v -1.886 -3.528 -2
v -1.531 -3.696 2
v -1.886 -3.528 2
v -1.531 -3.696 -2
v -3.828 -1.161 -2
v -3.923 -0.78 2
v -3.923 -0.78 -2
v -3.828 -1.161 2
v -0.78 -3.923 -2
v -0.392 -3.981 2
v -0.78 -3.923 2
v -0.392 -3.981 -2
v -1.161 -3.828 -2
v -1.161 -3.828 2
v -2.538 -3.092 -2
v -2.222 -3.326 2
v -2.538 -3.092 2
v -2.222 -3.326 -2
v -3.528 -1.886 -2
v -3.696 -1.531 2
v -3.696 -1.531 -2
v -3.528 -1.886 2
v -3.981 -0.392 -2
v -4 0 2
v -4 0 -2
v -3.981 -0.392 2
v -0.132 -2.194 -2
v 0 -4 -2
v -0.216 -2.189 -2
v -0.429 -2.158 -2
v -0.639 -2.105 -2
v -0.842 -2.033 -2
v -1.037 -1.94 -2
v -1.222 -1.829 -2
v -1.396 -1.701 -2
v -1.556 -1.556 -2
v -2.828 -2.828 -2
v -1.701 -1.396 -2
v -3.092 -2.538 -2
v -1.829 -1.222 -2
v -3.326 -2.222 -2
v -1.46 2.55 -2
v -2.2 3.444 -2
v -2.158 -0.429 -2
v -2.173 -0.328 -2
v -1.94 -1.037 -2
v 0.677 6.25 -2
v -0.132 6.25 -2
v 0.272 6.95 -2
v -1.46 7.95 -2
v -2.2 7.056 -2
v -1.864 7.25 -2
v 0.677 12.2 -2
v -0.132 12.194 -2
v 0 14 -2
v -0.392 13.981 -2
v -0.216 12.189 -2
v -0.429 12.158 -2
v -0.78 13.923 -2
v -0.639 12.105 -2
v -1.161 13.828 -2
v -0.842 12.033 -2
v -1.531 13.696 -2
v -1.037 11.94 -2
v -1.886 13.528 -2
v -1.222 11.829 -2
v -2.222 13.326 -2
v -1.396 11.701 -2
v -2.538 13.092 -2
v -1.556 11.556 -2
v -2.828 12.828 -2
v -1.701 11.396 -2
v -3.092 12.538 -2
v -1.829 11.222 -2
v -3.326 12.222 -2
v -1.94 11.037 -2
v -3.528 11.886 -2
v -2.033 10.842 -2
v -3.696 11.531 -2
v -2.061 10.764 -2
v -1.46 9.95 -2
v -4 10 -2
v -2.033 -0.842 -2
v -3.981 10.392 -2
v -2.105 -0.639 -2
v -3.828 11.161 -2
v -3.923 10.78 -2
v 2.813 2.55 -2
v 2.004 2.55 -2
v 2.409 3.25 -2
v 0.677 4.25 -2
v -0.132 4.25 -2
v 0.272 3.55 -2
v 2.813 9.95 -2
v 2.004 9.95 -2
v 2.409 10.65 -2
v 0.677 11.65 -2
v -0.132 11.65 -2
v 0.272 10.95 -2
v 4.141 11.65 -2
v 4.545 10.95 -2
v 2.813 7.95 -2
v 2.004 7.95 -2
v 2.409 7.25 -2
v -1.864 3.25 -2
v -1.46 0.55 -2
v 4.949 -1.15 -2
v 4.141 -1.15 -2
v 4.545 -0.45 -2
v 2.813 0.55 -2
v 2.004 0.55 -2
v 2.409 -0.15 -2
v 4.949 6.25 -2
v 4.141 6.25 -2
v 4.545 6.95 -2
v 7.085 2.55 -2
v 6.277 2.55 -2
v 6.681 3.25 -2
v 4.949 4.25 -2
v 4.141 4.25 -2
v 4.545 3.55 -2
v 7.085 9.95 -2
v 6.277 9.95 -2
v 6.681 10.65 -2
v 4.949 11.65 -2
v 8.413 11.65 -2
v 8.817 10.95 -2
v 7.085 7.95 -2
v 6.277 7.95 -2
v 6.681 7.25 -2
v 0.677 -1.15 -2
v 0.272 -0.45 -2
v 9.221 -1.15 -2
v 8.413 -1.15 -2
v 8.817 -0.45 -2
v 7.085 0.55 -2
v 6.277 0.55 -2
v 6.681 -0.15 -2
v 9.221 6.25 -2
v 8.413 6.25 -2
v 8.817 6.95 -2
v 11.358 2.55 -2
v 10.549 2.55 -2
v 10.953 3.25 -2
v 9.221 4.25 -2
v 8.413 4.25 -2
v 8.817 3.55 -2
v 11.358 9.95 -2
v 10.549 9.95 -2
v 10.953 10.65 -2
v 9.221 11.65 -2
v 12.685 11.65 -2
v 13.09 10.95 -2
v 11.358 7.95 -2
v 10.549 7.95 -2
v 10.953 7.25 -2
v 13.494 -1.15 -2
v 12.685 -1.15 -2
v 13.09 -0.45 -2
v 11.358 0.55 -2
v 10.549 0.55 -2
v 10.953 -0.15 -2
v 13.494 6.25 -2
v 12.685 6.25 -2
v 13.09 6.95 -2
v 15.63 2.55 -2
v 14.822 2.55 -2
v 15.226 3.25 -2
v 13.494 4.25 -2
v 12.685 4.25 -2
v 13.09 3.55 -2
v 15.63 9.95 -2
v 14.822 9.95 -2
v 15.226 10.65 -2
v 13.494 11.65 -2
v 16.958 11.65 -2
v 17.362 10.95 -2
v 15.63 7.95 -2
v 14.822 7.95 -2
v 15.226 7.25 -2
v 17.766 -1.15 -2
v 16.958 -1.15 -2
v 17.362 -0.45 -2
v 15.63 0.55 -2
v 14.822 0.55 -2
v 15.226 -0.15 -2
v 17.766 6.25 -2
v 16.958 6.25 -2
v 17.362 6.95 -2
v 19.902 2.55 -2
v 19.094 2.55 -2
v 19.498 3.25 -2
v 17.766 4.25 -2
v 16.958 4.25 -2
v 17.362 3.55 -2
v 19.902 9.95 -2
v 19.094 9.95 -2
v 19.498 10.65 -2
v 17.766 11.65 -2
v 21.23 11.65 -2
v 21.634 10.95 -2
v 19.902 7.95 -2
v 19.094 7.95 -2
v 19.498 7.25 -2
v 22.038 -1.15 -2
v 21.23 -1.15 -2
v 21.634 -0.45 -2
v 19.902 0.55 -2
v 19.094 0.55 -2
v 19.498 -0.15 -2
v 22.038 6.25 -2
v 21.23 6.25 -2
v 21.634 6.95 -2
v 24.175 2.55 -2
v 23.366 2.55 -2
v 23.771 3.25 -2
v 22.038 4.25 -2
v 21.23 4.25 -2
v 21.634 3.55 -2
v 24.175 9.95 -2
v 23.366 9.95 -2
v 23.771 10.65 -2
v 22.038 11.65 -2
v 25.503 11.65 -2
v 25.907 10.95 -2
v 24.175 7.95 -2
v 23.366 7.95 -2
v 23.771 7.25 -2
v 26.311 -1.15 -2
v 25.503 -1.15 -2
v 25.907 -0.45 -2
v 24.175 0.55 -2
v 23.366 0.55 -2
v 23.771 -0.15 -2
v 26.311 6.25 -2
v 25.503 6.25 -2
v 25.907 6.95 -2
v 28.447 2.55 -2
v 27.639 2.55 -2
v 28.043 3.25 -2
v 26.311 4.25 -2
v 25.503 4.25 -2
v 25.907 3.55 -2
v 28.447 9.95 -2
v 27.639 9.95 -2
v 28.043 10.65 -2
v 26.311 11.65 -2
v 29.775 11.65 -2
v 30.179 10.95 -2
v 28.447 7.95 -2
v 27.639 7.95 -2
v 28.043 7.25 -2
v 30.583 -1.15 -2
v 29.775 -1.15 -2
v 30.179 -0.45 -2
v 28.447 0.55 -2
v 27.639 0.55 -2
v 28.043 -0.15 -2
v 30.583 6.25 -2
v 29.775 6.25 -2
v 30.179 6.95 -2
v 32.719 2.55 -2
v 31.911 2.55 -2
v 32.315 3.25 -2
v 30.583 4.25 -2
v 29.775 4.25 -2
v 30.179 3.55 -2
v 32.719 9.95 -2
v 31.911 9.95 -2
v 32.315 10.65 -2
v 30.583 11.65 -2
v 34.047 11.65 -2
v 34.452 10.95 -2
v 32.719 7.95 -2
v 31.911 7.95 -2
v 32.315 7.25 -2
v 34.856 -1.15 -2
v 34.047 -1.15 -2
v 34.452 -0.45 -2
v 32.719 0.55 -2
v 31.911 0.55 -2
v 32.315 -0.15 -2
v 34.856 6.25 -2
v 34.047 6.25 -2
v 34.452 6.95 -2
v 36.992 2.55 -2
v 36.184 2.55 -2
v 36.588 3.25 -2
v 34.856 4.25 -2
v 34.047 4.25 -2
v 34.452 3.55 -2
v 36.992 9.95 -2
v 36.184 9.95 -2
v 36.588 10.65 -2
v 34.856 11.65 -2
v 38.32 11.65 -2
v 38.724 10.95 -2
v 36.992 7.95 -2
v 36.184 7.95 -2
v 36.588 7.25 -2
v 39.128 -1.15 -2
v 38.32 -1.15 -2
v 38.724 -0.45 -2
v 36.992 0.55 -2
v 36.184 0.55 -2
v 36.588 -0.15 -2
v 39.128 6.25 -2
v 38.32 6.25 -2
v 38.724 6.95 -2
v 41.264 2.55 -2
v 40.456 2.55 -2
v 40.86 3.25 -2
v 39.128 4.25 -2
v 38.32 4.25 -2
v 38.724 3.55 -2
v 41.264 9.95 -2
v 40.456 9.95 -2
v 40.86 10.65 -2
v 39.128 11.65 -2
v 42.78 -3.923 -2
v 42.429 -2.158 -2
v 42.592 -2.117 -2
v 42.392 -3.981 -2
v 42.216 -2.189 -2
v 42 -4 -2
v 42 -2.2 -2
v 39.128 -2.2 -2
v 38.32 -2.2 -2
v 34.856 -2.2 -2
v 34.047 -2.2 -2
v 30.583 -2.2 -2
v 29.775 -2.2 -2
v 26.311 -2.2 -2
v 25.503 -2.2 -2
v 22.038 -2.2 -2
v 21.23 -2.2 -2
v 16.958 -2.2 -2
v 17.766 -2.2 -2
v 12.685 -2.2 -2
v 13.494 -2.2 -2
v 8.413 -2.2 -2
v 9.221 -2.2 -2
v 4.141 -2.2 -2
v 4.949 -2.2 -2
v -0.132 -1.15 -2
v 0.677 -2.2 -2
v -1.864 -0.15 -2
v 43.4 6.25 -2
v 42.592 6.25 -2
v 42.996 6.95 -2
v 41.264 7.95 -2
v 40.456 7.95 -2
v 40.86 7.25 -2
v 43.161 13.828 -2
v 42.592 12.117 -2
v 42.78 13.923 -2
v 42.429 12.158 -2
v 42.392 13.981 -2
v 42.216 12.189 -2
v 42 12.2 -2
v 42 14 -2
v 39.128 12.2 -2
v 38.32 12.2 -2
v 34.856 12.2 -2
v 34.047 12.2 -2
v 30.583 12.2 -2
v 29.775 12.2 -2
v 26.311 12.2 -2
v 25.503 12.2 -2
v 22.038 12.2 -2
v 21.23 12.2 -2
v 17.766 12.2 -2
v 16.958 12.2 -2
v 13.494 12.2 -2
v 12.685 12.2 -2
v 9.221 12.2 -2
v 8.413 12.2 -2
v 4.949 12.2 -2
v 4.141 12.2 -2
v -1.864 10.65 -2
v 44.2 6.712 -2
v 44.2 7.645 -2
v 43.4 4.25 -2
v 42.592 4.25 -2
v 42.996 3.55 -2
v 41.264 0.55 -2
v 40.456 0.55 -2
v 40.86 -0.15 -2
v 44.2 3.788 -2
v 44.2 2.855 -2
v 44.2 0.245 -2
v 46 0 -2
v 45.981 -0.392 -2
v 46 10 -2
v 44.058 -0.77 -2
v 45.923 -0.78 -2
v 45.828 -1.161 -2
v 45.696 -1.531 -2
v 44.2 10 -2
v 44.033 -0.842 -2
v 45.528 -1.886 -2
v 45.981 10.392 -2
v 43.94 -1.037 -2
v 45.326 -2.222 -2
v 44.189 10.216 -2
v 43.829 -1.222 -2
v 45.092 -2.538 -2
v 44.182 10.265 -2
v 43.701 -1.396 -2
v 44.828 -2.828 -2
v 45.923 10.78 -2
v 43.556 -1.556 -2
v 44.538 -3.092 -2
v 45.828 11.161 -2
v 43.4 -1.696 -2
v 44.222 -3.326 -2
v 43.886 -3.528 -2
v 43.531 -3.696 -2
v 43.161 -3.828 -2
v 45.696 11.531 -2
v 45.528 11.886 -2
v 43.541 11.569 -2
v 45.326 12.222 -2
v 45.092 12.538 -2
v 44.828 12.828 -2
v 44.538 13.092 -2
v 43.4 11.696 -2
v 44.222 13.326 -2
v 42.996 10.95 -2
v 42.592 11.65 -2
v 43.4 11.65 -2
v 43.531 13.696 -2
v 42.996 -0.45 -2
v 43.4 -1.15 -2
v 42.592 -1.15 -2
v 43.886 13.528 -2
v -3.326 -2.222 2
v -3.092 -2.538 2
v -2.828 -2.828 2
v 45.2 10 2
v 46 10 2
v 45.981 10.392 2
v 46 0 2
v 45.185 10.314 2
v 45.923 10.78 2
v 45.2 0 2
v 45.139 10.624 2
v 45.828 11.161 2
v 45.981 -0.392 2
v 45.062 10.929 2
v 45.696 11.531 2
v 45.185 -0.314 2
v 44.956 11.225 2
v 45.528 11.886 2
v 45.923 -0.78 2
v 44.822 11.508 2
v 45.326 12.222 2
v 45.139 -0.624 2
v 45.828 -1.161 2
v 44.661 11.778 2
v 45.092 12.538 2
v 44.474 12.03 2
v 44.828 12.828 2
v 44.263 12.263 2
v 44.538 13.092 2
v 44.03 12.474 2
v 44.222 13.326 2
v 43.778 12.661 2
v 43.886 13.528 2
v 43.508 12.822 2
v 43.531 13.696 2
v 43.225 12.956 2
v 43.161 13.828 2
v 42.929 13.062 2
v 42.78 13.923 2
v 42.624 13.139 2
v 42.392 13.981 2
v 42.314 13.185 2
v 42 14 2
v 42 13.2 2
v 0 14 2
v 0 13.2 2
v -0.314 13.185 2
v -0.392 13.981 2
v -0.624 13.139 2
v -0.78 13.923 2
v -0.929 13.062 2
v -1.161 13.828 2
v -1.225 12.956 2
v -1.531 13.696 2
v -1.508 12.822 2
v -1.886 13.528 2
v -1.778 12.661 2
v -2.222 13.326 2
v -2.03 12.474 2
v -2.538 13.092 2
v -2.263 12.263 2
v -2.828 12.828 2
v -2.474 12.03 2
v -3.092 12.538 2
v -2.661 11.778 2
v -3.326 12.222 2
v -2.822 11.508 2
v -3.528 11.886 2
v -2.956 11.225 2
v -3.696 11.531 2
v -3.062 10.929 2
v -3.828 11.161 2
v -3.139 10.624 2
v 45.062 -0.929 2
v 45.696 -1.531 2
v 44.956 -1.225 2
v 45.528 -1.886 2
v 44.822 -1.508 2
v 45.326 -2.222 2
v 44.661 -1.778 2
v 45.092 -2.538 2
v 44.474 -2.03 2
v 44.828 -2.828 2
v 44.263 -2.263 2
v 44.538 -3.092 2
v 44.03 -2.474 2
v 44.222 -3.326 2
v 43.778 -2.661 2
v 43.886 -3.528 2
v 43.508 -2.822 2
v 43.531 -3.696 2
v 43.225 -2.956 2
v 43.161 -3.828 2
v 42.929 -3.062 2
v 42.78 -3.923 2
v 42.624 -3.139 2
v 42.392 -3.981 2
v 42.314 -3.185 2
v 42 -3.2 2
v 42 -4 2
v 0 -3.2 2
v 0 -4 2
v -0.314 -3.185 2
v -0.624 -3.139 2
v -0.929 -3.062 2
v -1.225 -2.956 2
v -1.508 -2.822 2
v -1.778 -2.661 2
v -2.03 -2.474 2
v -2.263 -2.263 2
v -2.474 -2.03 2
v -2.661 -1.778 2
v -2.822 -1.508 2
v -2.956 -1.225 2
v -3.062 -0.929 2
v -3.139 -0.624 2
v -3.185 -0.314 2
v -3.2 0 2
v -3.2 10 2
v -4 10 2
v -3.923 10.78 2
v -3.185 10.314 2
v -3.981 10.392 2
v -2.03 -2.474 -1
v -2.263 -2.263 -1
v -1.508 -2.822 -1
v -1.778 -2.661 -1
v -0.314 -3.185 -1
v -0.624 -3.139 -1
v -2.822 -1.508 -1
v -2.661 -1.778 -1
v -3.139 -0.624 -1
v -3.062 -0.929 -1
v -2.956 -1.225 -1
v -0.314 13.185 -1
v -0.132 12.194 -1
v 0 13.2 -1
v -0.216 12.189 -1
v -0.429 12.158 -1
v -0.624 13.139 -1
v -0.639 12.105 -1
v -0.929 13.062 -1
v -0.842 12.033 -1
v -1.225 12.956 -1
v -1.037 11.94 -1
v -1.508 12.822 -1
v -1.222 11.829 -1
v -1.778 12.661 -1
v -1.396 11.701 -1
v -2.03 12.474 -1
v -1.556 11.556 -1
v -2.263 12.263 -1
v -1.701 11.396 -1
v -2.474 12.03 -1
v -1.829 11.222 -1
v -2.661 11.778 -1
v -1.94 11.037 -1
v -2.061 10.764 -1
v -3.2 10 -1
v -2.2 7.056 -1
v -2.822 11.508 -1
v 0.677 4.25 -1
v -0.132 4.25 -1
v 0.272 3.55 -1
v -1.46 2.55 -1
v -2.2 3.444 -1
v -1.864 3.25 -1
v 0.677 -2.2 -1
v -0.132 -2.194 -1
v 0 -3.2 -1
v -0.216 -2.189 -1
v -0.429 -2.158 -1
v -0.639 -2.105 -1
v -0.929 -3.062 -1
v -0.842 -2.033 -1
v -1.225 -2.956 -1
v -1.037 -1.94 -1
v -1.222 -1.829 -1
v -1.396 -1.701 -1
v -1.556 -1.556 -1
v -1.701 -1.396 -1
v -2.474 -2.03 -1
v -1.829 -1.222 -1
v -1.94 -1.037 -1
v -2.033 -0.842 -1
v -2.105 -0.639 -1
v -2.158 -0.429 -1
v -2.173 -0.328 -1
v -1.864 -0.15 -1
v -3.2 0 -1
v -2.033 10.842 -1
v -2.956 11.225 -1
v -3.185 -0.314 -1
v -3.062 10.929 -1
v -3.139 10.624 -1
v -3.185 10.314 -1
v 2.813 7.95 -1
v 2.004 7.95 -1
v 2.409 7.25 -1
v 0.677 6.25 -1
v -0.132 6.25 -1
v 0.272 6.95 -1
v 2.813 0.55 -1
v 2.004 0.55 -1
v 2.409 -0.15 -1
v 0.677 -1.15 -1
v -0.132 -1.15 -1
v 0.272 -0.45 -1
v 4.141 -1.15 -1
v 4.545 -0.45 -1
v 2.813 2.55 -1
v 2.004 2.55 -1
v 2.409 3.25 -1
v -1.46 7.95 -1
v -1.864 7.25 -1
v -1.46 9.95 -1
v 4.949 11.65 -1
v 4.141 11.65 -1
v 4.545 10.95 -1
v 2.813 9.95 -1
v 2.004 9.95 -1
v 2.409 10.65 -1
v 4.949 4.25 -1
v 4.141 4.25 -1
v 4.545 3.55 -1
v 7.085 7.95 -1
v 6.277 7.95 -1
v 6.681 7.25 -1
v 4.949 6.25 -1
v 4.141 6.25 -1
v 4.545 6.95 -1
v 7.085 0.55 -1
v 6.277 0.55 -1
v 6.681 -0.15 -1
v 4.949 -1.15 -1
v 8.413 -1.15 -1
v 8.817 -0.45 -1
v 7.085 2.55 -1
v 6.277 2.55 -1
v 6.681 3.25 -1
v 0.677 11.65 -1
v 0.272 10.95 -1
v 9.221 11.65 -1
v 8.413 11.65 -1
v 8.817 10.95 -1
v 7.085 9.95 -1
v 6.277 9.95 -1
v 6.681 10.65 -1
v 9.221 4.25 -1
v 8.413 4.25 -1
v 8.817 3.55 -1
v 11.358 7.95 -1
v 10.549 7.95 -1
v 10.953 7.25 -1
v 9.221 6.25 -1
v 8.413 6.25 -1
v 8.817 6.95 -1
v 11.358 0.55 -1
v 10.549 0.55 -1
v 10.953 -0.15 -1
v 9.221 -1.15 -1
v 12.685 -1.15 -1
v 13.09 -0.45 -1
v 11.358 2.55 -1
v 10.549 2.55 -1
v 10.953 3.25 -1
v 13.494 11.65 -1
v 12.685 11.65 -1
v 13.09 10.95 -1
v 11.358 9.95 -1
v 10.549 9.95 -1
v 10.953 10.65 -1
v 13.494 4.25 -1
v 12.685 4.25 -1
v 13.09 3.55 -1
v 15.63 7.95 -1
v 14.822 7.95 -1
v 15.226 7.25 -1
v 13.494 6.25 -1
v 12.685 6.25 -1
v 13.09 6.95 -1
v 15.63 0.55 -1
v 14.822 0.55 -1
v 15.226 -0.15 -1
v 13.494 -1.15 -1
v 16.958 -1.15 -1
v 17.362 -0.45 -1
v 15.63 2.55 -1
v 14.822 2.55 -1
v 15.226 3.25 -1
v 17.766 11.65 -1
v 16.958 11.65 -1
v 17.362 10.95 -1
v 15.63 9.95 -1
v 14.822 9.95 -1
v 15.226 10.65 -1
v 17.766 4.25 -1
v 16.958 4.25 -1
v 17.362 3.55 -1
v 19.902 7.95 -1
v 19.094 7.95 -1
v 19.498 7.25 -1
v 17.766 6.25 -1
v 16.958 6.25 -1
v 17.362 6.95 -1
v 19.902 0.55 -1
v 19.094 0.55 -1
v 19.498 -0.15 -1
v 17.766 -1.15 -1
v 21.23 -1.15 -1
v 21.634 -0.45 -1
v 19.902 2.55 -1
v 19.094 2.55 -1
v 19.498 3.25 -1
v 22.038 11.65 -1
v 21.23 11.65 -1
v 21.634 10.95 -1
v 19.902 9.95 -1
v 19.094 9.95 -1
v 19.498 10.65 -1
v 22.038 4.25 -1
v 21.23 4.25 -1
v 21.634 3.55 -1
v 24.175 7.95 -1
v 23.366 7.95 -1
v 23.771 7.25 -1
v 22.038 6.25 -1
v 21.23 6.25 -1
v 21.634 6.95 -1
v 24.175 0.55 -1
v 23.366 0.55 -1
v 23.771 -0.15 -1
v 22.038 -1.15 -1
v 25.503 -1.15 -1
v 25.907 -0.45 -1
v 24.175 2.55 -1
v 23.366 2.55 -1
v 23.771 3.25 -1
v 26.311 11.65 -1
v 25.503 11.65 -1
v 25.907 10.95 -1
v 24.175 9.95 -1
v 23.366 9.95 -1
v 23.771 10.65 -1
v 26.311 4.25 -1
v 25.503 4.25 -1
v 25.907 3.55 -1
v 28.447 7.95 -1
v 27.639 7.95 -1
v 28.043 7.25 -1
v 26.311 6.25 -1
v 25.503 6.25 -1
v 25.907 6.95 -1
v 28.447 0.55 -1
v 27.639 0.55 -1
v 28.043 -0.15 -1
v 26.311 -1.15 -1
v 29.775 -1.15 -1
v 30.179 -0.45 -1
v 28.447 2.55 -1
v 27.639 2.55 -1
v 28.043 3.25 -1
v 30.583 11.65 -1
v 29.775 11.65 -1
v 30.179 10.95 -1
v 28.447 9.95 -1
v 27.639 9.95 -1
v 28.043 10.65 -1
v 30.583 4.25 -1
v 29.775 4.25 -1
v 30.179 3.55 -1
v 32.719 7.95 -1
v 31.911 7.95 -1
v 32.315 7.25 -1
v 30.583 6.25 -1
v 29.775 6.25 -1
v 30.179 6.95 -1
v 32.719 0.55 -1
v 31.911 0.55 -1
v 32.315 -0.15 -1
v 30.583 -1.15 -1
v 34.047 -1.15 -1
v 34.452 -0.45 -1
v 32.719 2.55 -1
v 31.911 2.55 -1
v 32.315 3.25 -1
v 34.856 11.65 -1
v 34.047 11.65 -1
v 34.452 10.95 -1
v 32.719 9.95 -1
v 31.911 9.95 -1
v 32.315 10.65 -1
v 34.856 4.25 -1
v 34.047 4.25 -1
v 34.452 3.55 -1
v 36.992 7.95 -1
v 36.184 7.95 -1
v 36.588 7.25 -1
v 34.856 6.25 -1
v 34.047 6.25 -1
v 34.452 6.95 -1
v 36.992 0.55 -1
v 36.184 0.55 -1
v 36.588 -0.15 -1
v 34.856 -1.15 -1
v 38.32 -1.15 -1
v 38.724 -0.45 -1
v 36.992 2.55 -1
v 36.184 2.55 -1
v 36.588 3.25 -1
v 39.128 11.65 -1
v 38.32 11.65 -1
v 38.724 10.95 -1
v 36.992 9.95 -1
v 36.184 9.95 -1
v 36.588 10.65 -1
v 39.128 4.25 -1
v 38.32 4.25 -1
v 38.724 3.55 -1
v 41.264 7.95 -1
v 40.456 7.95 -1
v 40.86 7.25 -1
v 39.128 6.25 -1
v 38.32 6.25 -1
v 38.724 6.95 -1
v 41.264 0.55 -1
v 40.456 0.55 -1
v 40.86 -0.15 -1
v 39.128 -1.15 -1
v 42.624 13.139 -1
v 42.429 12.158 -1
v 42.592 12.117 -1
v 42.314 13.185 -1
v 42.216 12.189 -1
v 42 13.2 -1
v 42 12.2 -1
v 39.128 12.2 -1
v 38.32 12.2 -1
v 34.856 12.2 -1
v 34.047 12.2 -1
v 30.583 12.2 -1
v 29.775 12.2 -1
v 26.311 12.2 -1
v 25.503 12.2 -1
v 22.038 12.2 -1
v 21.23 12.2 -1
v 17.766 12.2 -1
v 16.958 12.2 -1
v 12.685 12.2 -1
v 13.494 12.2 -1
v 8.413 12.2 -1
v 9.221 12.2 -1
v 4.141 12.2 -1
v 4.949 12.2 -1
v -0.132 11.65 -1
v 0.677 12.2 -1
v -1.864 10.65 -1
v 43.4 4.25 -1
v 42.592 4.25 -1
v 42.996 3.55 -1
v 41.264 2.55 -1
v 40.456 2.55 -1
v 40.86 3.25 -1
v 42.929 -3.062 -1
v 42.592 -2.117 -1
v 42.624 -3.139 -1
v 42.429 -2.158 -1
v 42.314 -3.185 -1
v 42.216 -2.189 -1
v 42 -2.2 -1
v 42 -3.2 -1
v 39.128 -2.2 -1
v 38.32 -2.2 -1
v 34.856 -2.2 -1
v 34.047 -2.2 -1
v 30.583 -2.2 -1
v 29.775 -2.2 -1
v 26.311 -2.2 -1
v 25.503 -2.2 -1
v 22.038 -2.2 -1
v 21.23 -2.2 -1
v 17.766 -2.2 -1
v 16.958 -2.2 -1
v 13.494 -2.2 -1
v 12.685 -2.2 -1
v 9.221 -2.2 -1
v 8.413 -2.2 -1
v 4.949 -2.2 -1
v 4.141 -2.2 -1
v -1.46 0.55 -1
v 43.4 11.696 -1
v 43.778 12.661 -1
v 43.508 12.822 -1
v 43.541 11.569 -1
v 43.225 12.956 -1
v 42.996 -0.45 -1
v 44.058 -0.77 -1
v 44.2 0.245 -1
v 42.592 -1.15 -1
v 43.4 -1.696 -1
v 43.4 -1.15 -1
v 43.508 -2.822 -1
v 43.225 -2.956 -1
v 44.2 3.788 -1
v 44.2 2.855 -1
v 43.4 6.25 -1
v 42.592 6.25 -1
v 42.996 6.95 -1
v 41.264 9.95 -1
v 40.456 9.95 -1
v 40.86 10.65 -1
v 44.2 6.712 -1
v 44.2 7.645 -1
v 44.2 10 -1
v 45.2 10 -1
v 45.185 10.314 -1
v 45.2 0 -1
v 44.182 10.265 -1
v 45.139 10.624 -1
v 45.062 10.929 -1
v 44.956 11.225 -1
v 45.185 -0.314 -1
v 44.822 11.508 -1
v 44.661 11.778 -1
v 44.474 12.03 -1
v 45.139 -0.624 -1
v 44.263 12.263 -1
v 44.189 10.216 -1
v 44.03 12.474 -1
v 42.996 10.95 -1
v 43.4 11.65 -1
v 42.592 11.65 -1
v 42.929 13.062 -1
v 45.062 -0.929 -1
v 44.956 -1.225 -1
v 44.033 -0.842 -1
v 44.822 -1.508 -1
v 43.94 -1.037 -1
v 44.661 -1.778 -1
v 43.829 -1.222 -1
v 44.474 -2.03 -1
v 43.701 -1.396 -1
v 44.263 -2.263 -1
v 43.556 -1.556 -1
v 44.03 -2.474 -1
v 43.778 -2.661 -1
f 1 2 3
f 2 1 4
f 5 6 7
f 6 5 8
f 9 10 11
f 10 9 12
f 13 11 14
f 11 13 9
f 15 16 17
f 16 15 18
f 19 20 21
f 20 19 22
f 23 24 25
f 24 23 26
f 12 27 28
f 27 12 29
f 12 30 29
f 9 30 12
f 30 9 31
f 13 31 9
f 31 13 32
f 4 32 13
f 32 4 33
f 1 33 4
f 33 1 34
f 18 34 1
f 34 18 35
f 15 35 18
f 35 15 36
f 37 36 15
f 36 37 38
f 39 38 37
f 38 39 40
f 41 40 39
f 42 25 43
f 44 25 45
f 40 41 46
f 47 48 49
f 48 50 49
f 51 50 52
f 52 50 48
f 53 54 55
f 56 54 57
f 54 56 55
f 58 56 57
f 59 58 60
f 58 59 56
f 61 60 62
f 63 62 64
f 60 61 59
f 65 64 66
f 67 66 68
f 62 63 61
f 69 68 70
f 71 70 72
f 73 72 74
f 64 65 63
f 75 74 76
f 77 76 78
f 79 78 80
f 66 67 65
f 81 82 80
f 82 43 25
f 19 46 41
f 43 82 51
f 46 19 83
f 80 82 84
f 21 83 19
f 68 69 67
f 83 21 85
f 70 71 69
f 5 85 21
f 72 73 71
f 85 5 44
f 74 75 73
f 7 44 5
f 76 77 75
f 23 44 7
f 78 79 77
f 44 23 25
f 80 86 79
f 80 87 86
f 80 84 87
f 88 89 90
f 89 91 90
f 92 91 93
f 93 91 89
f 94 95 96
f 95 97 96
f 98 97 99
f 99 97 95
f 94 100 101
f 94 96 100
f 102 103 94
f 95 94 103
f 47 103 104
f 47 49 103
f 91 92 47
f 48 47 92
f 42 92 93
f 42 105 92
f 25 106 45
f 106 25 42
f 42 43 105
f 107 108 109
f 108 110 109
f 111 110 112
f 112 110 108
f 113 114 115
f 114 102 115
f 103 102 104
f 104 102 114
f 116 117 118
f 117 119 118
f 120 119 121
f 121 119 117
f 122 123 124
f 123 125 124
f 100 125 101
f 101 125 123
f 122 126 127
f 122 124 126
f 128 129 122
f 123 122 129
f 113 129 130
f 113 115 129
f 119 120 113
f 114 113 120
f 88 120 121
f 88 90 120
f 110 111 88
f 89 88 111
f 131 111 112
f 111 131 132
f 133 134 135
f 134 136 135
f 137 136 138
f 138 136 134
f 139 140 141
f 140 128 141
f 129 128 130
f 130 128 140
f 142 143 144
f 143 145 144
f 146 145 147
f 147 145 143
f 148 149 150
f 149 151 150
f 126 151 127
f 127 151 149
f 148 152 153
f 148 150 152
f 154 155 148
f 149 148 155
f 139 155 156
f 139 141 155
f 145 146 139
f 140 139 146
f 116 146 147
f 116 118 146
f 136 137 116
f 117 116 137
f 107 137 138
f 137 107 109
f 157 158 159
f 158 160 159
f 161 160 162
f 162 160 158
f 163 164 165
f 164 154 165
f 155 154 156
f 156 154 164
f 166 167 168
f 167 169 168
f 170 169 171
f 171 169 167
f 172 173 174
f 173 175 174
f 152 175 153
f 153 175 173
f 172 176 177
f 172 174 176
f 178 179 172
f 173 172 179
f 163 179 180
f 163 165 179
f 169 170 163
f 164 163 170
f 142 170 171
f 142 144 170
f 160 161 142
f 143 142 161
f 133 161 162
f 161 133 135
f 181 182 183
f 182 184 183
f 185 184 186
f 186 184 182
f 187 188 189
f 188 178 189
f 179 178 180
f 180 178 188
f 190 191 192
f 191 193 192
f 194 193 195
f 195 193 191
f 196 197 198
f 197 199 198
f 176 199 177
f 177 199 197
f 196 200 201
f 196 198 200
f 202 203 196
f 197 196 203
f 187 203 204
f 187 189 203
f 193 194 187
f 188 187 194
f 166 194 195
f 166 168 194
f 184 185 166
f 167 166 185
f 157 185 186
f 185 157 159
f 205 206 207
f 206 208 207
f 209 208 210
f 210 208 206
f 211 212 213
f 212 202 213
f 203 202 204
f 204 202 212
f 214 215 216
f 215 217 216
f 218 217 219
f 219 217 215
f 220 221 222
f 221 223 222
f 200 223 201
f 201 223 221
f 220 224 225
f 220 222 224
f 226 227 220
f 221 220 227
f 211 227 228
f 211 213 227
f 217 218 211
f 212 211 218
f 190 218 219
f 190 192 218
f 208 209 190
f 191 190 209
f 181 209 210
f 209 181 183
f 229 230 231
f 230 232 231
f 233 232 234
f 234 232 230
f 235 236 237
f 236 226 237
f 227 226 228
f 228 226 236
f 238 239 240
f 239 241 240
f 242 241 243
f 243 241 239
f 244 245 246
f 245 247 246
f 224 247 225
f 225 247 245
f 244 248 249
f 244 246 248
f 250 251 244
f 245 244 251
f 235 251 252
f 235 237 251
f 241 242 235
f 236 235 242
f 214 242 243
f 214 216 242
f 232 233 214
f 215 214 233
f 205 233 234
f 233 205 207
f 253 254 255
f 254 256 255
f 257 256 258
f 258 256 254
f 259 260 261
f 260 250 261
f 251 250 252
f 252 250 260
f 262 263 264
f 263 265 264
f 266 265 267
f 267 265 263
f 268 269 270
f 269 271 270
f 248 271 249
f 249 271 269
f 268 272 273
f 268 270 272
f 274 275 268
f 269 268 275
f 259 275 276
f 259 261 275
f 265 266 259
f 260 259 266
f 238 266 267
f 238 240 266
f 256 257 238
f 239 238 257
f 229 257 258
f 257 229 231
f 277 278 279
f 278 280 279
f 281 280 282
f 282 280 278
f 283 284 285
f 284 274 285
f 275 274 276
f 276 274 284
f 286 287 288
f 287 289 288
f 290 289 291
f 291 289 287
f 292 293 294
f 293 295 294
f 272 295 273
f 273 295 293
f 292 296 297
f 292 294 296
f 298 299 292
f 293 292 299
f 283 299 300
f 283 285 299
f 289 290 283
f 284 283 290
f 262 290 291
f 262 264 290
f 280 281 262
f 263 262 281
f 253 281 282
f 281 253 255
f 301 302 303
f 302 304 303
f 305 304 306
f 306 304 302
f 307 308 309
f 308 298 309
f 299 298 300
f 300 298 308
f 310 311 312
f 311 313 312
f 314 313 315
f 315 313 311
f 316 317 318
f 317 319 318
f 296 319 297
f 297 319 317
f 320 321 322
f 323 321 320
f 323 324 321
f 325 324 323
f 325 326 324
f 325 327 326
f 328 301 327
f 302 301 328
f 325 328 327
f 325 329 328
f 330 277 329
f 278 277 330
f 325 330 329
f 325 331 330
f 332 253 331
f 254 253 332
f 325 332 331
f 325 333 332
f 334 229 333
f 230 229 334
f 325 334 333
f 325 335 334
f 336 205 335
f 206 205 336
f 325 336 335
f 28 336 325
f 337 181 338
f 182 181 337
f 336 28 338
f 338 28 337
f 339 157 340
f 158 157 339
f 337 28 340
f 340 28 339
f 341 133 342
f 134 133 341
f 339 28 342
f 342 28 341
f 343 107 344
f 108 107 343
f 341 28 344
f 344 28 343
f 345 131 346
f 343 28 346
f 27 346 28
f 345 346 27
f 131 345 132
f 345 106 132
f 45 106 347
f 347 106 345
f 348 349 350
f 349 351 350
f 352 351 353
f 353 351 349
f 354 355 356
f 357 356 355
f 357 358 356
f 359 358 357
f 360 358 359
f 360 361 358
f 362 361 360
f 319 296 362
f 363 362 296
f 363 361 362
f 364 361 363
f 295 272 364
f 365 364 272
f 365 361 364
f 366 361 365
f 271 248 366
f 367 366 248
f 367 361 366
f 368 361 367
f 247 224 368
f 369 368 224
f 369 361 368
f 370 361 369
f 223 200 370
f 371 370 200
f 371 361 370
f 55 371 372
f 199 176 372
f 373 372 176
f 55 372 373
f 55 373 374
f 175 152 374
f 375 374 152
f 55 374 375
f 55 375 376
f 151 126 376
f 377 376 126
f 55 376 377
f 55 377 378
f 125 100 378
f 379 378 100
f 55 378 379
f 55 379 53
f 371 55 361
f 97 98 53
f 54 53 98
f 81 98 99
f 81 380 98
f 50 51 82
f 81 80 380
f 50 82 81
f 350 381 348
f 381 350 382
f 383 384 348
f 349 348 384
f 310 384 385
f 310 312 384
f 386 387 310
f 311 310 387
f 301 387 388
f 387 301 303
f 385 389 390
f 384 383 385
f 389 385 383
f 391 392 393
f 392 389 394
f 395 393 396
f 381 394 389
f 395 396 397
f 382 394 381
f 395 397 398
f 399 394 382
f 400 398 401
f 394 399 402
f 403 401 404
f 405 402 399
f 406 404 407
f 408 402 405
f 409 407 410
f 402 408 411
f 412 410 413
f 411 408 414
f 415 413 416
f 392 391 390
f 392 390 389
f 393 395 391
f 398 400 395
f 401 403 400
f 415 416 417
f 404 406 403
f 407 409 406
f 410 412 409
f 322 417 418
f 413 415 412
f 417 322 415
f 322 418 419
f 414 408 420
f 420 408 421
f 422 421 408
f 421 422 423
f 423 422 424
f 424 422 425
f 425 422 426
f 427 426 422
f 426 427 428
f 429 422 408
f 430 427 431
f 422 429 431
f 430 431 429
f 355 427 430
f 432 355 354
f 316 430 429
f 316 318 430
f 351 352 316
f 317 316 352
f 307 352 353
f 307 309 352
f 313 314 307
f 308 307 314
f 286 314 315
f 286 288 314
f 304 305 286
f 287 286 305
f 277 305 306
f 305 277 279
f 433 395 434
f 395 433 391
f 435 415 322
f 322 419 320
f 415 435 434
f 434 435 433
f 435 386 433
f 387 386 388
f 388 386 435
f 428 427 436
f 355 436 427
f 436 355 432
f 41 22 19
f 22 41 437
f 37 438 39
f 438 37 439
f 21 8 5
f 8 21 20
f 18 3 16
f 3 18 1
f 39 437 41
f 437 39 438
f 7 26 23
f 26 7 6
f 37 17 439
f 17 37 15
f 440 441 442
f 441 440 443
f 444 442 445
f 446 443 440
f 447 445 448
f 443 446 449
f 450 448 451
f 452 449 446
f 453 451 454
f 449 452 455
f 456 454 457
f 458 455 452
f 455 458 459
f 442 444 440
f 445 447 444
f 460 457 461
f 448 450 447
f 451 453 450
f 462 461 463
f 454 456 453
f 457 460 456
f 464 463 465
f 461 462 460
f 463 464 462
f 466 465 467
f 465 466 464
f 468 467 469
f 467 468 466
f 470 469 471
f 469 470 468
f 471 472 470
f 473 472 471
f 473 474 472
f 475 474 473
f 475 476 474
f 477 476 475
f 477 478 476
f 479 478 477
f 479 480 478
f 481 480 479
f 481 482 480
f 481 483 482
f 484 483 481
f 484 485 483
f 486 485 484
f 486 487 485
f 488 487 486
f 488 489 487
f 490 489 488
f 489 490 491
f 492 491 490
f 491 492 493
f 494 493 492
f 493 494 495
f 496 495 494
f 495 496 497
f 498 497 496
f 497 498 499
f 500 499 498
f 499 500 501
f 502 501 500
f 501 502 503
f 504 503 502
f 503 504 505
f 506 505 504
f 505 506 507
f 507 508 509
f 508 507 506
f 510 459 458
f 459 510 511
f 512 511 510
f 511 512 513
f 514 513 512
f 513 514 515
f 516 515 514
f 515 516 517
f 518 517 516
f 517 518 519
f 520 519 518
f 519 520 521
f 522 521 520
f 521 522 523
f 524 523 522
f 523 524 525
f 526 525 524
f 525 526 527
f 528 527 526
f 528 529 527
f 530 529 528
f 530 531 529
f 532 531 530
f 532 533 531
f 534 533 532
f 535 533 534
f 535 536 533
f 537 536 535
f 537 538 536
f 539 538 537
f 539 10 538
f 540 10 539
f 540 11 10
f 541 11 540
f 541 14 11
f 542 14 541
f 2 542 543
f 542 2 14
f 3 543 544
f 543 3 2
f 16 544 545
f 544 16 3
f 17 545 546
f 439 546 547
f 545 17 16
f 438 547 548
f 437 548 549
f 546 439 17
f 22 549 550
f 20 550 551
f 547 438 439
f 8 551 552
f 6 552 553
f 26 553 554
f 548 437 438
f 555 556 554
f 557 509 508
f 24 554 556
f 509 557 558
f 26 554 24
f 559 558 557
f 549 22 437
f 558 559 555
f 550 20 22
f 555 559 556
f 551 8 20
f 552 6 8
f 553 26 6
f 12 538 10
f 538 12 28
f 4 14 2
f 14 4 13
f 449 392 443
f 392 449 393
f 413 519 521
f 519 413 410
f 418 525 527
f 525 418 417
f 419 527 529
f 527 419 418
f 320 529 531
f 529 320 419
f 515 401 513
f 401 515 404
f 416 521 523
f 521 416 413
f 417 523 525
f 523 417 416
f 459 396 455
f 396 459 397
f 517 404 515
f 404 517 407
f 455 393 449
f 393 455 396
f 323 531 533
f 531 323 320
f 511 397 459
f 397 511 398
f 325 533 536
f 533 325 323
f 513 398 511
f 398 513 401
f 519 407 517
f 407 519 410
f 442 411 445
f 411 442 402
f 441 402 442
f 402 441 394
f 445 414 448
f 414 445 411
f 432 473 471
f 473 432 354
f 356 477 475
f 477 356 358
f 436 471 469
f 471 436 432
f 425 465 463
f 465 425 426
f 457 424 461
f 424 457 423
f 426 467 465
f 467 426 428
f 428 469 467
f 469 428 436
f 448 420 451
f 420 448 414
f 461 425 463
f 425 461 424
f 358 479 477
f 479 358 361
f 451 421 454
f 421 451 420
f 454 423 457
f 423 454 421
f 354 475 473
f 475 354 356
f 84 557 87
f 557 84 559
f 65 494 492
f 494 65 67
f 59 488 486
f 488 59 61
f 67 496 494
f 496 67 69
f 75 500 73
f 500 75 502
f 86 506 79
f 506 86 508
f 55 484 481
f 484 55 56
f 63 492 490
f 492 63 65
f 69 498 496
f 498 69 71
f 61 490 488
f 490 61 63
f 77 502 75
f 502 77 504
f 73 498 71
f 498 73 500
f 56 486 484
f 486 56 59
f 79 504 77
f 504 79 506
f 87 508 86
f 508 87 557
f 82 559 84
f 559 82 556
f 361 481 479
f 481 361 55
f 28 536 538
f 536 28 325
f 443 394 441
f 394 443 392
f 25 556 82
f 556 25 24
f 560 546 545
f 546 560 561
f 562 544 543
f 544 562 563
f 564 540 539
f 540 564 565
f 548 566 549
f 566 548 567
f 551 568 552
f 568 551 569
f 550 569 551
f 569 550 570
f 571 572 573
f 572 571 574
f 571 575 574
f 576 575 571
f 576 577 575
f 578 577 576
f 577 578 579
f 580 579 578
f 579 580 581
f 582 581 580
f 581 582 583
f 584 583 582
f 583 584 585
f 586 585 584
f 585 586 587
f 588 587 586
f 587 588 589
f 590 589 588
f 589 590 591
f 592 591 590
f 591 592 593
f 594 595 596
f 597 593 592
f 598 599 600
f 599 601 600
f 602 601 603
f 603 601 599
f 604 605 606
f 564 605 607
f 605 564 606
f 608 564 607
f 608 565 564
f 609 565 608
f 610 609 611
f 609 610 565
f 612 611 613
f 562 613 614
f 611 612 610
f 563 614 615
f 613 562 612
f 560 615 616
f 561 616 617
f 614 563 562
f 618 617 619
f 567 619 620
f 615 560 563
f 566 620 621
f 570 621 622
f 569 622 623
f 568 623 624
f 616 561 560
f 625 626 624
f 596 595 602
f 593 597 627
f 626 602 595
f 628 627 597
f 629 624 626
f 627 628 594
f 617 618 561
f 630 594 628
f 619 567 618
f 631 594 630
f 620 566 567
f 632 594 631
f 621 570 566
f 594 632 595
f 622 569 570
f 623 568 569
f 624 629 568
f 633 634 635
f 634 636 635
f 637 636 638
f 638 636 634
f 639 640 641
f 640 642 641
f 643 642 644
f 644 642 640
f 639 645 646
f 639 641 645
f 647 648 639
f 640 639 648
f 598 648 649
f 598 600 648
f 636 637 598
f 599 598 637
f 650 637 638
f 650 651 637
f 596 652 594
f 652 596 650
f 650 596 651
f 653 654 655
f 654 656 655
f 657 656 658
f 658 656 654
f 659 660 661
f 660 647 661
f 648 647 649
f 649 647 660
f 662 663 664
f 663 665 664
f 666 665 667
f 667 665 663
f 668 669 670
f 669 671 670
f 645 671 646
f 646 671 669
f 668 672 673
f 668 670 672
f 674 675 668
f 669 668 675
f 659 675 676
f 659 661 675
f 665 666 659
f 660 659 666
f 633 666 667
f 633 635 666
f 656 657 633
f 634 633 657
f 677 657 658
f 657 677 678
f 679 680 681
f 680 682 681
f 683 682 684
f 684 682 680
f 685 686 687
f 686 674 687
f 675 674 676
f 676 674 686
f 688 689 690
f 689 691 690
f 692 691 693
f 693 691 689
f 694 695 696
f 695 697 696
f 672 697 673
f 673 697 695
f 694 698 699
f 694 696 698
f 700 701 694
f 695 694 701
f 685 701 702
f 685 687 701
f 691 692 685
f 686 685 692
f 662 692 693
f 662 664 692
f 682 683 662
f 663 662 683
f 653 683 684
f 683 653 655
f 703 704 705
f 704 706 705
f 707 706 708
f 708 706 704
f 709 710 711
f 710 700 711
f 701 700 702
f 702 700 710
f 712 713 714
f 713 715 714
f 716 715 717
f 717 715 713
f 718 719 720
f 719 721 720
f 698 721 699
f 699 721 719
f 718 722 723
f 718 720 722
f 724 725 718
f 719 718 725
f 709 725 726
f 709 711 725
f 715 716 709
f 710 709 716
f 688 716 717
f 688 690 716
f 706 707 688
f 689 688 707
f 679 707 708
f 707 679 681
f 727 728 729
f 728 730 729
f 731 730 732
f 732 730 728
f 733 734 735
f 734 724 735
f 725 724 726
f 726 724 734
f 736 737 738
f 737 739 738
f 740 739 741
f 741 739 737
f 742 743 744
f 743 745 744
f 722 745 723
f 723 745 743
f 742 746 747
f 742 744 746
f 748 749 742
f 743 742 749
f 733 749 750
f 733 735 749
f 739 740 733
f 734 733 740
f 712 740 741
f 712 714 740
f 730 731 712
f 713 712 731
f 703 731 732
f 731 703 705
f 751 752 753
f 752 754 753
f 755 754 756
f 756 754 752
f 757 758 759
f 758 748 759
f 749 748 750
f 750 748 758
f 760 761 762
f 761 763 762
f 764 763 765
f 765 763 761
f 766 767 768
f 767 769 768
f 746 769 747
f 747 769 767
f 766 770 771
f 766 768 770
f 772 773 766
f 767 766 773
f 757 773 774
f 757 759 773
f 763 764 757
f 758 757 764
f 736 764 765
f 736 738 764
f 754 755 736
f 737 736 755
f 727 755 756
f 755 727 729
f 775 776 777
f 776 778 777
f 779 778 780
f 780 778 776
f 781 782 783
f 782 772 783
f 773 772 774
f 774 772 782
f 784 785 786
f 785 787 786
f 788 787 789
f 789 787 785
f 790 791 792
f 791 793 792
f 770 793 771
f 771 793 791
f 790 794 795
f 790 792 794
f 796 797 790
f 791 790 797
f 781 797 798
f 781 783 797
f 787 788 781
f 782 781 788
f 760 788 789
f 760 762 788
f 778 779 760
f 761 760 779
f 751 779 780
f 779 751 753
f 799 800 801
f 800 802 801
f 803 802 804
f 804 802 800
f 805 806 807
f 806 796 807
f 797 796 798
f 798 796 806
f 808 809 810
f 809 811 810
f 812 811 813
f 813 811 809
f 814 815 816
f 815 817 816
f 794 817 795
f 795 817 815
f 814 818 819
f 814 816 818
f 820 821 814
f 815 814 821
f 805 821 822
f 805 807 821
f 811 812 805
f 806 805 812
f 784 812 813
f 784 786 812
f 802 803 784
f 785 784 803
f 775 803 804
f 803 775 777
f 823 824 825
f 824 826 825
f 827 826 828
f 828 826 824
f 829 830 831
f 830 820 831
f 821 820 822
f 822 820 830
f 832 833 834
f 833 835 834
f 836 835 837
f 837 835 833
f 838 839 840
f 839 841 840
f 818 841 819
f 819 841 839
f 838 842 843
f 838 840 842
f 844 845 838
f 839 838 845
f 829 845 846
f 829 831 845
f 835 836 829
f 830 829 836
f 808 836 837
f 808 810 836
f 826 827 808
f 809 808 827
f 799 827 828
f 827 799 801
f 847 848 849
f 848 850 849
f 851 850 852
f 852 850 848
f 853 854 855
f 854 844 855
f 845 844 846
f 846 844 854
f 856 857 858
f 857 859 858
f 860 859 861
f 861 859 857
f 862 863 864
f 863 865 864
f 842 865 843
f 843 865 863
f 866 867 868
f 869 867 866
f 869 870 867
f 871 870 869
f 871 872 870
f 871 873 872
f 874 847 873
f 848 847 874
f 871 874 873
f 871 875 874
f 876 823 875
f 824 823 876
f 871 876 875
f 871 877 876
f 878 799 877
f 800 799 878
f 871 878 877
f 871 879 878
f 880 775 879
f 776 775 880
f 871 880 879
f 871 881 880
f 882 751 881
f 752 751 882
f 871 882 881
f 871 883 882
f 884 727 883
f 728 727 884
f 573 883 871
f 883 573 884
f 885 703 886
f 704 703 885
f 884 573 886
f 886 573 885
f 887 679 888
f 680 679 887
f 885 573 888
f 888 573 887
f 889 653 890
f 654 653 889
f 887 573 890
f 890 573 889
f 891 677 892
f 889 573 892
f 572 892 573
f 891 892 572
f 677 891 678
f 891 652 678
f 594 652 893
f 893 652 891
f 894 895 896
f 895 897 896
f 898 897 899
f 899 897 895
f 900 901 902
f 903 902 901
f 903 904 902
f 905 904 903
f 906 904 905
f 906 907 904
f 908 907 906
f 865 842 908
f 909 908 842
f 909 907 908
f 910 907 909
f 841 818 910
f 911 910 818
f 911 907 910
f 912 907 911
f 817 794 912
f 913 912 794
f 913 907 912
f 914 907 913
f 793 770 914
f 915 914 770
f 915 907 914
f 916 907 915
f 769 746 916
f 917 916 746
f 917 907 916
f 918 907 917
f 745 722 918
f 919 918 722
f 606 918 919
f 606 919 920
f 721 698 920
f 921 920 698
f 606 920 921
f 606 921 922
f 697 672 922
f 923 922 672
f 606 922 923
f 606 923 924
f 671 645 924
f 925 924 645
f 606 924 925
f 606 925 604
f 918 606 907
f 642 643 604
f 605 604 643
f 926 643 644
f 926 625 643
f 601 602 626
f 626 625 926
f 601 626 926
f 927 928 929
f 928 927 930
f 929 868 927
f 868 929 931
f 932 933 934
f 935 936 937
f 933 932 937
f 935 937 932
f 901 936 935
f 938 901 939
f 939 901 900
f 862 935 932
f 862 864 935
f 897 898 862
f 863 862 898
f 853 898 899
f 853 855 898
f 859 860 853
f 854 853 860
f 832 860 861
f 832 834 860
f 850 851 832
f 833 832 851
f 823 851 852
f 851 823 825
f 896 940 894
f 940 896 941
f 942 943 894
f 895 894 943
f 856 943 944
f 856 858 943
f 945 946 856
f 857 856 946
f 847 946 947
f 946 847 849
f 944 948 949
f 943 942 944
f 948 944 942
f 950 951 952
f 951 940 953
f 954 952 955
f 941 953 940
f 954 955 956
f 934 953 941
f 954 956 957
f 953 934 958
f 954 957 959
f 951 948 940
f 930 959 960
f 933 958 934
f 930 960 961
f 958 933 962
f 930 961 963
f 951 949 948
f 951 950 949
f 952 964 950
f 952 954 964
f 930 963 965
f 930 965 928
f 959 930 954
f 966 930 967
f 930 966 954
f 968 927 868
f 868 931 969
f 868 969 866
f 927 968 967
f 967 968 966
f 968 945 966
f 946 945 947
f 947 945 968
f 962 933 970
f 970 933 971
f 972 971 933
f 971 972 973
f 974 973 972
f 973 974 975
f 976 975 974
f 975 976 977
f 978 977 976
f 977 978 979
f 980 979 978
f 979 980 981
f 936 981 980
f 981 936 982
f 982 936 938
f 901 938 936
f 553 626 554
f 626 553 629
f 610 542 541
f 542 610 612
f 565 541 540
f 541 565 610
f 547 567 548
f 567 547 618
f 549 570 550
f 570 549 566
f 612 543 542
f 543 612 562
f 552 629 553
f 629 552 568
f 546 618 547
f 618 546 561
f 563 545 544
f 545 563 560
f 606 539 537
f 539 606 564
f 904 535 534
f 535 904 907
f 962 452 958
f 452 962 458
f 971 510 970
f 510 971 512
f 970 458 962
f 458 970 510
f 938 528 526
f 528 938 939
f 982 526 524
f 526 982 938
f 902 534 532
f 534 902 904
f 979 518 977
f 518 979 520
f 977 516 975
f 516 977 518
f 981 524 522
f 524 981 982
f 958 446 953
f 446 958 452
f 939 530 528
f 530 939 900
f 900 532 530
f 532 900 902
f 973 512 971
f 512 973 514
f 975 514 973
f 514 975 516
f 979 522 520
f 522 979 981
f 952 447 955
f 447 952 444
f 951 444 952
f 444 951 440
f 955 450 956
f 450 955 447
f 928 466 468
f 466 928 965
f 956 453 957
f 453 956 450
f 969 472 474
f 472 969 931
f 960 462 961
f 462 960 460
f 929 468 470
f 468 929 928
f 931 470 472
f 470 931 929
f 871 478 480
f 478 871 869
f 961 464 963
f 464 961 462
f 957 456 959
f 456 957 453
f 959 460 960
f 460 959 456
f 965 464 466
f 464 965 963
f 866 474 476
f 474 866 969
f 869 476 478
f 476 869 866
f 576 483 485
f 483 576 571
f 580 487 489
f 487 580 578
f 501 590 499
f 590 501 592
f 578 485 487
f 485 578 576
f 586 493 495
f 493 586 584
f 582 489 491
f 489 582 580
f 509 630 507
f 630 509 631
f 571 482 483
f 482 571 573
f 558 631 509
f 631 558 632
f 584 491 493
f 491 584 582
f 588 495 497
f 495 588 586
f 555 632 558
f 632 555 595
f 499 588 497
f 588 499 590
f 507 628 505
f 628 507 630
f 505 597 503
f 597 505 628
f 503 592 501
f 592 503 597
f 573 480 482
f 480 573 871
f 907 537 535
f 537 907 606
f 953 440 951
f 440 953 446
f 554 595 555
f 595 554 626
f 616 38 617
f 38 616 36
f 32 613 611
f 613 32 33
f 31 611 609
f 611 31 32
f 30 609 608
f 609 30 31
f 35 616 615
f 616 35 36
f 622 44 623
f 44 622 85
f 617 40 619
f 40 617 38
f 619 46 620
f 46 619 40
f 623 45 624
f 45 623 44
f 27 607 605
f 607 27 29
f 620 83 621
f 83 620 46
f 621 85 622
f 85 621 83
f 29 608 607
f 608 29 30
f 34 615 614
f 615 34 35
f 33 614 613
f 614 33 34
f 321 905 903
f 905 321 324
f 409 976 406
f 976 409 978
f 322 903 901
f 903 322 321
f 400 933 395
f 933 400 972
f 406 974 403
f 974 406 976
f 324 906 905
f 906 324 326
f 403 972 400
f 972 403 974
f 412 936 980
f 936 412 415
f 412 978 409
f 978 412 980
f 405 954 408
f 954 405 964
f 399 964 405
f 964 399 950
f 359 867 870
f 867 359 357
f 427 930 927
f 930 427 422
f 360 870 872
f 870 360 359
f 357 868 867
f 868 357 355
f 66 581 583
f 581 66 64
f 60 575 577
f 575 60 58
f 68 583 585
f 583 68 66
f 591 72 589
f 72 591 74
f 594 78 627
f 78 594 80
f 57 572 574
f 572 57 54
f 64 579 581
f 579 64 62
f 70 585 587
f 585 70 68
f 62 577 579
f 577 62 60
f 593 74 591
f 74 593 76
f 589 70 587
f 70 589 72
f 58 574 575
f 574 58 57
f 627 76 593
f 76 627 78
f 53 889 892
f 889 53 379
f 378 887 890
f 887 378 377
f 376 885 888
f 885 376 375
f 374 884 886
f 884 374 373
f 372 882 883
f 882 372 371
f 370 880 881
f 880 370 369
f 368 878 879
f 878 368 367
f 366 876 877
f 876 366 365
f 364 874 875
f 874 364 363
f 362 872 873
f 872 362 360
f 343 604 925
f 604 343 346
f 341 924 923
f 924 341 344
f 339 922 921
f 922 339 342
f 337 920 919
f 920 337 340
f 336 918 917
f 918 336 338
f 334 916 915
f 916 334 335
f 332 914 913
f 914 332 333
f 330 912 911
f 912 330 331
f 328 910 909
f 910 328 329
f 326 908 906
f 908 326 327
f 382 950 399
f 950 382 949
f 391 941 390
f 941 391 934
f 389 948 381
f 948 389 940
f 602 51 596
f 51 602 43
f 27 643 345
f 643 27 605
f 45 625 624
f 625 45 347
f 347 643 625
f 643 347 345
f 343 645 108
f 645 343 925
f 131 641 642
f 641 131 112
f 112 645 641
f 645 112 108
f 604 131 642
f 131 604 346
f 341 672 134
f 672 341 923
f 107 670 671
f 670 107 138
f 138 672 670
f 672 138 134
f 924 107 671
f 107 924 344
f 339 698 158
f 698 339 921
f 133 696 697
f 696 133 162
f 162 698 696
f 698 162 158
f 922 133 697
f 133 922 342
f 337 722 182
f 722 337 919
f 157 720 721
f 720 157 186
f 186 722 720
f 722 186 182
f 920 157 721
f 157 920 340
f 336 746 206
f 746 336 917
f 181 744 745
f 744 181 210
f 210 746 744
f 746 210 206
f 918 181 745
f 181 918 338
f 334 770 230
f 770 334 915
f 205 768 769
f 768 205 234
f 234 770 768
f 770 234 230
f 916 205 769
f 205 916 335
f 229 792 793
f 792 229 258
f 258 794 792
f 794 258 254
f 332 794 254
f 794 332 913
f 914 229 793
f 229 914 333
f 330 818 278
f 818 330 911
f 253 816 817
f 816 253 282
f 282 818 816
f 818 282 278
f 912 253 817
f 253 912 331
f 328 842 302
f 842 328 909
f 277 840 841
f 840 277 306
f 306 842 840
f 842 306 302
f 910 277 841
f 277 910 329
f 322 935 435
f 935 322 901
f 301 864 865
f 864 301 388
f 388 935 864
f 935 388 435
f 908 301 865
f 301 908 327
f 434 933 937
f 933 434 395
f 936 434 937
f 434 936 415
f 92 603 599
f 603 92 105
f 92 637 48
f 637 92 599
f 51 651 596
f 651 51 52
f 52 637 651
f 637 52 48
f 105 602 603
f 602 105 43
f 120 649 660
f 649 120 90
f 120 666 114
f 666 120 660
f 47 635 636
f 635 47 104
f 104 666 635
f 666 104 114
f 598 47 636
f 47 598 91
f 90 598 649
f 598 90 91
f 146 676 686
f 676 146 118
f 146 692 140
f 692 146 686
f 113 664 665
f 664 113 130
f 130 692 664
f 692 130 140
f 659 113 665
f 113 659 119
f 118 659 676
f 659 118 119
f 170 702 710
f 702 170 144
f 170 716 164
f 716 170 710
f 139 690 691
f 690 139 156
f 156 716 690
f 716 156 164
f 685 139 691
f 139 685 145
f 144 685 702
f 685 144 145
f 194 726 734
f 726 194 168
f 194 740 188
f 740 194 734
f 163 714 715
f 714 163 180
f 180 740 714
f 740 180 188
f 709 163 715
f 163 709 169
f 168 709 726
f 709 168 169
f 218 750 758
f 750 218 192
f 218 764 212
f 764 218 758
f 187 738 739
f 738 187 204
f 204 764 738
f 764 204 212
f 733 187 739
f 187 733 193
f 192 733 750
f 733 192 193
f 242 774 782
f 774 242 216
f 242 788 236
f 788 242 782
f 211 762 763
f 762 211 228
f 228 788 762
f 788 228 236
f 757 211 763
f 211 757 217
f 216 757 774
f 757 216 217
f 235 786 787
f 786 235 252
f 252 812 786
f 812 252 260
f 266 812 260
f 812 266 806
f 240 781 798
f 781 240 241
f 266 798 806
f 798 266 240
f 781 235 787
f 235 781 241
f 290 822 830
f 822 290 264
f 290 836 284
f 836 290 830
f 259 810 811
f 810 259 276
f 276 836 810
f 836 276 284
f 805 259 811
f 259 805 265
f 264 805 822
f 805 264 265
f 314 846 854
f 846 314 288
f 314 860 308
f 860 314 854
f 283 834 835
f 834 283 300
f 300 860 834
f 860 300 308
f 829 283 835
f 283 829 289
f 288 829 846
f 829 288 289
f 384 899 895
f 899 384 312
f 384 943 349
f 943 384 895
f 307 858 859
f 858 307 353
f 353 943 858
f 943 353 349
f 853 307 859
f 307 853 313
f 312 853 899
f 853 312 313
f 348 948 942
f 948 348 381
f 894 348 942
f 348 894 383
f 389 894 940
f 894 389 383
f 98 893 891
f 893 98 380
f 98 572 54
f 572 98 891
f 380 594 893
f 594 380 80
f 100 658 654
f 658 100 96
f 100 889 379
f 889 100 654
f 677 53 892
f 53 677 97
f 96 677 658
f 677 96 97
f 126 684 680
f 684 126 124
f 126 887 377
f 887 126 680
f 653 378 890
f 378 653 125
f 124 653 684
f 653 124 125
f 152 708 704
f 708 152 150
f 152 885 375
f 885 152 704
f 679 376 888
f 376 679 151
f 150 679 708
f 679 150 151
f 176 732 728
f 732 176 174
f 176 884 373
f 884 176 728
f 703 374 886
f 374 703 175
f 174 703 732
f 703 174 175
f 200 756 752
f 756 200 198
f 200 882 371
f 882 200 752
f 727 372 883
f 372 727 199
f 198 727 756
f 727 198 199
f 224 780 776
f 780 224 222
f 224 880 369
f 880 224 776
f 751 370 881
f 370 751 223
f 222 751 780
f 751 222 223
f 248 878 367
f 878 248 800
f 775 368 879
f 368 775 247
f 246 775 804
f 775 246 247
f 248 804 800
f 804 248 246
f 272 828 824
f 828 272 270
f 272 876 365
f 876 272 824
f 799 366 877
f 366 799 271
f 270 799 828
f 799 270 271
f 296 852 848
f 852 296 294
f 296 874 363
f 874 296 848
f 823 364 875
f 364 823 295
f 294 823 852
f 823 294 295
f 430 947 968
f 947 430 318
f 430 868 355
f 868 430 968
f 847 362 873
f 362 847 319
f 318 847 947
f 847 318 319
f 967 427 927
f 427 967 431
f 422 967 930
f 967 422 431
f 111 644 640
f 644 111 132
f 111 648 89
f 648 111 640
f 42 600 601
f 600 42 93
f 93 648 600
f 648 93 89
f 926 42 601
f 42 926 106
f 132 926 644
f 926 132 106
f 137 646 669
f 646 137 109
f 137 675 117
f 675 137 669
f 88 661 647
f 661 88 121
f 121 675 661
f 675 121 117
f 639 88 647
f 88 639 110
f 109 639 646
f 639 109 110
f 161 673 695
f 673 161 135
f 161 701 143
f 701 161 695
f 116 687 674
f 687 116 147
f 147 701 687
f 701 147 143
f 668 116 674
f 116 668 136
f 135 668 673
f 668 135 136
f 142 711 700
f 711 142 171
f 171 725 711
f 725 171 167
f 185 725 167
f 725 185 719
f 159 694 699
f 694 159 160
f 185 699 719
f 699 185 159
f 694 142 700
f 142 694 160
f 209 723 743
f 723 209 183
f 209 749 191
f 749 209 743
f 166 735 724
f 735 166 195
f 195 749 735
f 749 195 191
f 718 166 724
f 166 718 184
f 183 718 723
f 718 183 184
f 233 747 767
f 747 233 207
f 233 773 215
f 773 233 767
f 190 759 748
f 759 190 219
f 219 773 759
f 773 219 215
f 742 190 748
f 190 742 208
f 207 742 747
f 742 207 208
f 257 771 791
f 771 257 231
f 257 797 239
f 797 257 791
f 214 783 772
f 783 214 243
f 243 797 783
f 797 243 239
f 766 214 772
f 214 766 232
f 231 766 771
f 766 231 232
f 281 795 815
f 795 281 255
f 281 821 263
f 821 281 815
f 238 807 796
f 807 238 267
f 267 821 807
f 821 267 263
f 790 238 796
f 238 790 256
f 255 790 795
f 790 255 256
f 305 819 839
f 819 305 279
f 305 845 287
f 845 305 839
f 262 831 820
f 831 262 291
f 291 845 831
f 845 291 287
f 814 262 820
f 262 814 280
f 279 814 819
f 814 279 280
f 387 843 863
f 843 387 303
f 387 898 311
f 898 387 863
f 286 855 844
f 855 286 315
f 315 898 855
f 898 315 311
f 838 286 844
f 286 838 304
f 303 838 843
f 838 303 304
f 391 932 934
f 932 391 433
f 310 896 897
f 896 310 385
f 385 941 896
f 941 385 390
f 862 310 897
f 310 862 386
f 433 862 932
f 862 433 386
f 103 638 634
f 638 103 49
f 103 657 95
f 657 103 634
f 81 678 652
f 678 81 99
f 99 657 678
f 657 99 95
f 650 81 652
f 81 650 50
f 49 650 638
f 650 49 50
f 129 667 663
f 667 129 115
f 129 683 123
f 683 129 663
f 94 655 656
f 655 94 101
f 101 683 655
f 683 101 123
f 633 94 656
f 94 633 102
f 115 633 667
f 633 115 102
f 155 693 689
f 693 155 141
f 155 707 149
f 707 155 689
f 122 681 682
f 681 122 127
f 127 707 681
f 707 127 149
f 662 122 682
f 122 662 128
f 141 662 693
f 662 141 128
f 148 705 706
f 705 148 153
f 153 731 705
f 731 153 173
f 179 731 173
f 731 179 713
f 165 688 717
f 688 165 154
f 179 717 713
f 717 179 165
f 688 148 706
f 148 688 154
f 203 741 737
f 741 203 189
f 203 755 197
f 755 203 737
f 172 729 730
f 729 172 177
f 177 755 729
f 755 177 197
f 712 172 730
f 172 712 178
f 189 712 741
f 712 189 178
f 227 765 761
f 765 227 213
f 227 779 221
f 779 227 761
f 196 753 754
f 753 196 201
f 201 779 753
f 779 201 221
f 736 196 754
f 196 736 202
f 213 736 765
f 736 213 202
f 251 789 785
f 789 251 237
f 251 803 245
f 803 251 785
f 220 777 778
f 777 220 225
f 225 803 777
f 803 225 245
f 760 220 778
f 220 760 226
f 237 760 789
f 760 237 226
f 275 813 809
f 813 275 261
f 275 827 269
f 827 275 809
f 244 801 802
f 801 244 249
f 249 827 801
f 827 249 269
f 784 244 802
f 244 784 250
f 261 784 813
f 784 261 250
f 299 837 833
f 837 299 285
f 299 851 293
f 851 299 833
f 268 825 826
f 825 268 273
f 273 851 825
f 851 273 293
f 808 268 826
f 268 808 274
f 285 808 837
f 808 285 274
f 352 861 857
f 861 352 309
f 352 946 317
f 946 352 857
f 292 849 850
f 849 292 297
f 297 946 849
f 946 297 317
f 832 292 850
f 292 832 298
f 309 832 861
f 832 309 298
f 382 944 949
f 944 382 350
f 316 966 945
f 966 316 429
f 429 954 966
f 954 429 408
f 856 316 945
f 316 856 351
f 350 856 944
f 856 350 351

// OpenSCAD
//This is a parametric script for generating footplates
//with holes with various number of sides.

// Created by Hamish Trolove - Oct 2018
//www.techmonkeybusiness.com

//FootPlatev9-Thingiverse.scad

//Licensed under a Creative Commons license - attribution
// share alike. CC-BY-SA

//No extra libraries are required and it works under 
//      OpenSCAD 2014 and OpenSCAD 2015.

//Basic Tray Dimensions

//Outer Corner Radius
LrgRad = 4;

//Inner Corner Radius
SmlRad = 3.2;

//Overall Length
Length = 50;

//Overall Width
Width = 18;

//Overall Tray Thickness
Thickness = 4;

//Depth of Tray Recess
TrayDepth = 3;

//Pattern Trimming Margin
PatternTrim = 1;

//Resolution of Curved Tray Edges
OuterCylRes = 64;

//Hole diameter
HoleD = 2;

//Number of Hole Rows
HoleRows = 4;

//Number of Side for the Holes
HoleRes = 6;

//Calculate the Active Width and Length for the Hexagonal Hole Pattern
ActWidth = Width - 4*(LrgRad-SmlRad);  // This allows the rim width clear of holes
ActLength = Length- 4*(LrgRad-SmlRad);

RowCLSpacing = ActWidth/HoleRows;
LenSpacing = 2*RowCLSpacing/sqrt(3);
NosLngth = ActLength/LenSpacing;

//Pattern trimming shape dimensions
TrimWidth = Width - 2*(LrgRad-SmlRad+PatternTrim);
TrimLength = Length - 2*(LrgRad-SmlRad+PatternTrim);
TrimRad = SmlRad - PatternTrim;


difference(){
	
	union()
	{
		cylinder(r=LrgRad,h=Thickness,center=true,$fn=OuterCylRes);
		translate([Length-2*LrgRad,0,0])
			cylinder(r=LrgRad,h=Thickness,center=true,$fn=OuterCylRes);
		translate([Length-2*LrgRad,Width-2*LrgRad,0])
			cylinder(r=LrgRad,h=Thickness,center=true,$fn=OuterCylRes);
		translate([0,Width-2*LrgRad,0])
			cylinder(r=LrgRad,h=Thickness,center=true,$fn=OuterCylRes);
		translate([(Length-2*LrgRad)/2,(Width-2*LrgRad)/2,0])cube([Length-2*LrgRad,Width,Thickness],center=true);
		translate([(Length-2*LrgRad)/2,(Width-2*LrgRad)/2,0])cube([Length,Width-2*LrgRad,Thickness],center=true);
	}

	union()
	{
	
		translate([0,0,Thickness-TrayDepth])cylinder(r=SmlRad,h=Thickness,center=true,$fn=OuterCylRes);
		translate([Length-2*LrgRad,0,Thickness-TrayDepth])
			cylinder(r=SmlRad,h=Thickness,center=true,$fn=OuterCylRes);
		translate([Length-2*LrgRad,Width-2*LrgRad,Thickness-TrayDepth])
			cylinder(r=SmlRad,h=Thickness,center=true,$fn=OuterCylRes);
		translate([0,Width-2*LrgRad,Thickness-TrayDepth])
			cylinder(r=SmlRad,h=Thickness,center=true,$fn=OuterCylRes);
		translate([(Length-2*LrgRad)/2,(Width-2*LrgRad)/2,Thickness-TrayDepth])cube([Length-2*LrgRad,Width-2*(LrgRad-SmlRad),Thickness],center=true);
		translate([(Length-2*LrgRad)/2,(Width-2*LrgRad)/2,Thickness-TrayDepth])cube([Length-2*(LrgRad-SmlRad),Width-2*LrgRad,Thickness],center=true);
	}
    
    intersection()
    {
        //Pattern Trim shape building
        union()
        {
            cylinder(r=TrimRad,h=Thickness*4,center=true,$fn=OuterCylRes);
            translate([TrimLength-2*TrimRad,0,0])
                cylinder(r=TrimRad,h=Thickness*4,center=true,$fn=OuterCylRes);
            translate([TrimLength-2*TrimRad,TrimWidth-2*TrimRad,0])
                cylinder(r=TrimRad,h=Thickness*4,center=true,$fn=OuterCylRes);
            translate([0,TrimWidth-2*TrimRad,0])
                cylinder(r=TrimRad,h=Thickness*4,center=true,$fn=OuterCylRes);
            translate([(TrimLength-2*TrimRad)/2,(TrimWidth-2*TrimRad)/2,0])cube([TrimLength-2*TrimRad,TrimWidth,Thickness*4],center=true);
            translate([(TrimLength-2*TrimRad)/2,(TrimWidth-2*TrimRad)/2,0])cube([TrimLength,TrimWidth-2*TrimRad,Thickness*4],center=true);
        }
        
        
        //Note: Extra row created so the slicing
        // using the pattern trimmer will create partial holes where needed.
        
        translate([-(LrgRad-0.5*LenSpacing),-(LrgRad-0.5*RowCLSpacing),-1]) 
        {
            for(rowA = [0:2:HoleRows])
            {
                for(i=[0:1:NosLngth+2])
                {
                    translate([i*LenSpacing,rowA*RowCLSpacing,0])
                        rotate([0,0,180/HoleRes])cylinder(r = HoleD,h=Thickness*3,center=true,$fn=HoleRes);
                }
            }
            
            for(rowB = [1:2:HoleRows])
            {
                for(i=[0:1:NosLngth+2])
                {
                    translate([LenSpacing*(i-0.5),rowB*RowCLSpacing,0])
                        rotate([0,0,180/HoleRes])cylinder(r = HoleD,h=Thickness*3,center=true,$fn=HoleRes);
                }
            }
        }
    }




}
